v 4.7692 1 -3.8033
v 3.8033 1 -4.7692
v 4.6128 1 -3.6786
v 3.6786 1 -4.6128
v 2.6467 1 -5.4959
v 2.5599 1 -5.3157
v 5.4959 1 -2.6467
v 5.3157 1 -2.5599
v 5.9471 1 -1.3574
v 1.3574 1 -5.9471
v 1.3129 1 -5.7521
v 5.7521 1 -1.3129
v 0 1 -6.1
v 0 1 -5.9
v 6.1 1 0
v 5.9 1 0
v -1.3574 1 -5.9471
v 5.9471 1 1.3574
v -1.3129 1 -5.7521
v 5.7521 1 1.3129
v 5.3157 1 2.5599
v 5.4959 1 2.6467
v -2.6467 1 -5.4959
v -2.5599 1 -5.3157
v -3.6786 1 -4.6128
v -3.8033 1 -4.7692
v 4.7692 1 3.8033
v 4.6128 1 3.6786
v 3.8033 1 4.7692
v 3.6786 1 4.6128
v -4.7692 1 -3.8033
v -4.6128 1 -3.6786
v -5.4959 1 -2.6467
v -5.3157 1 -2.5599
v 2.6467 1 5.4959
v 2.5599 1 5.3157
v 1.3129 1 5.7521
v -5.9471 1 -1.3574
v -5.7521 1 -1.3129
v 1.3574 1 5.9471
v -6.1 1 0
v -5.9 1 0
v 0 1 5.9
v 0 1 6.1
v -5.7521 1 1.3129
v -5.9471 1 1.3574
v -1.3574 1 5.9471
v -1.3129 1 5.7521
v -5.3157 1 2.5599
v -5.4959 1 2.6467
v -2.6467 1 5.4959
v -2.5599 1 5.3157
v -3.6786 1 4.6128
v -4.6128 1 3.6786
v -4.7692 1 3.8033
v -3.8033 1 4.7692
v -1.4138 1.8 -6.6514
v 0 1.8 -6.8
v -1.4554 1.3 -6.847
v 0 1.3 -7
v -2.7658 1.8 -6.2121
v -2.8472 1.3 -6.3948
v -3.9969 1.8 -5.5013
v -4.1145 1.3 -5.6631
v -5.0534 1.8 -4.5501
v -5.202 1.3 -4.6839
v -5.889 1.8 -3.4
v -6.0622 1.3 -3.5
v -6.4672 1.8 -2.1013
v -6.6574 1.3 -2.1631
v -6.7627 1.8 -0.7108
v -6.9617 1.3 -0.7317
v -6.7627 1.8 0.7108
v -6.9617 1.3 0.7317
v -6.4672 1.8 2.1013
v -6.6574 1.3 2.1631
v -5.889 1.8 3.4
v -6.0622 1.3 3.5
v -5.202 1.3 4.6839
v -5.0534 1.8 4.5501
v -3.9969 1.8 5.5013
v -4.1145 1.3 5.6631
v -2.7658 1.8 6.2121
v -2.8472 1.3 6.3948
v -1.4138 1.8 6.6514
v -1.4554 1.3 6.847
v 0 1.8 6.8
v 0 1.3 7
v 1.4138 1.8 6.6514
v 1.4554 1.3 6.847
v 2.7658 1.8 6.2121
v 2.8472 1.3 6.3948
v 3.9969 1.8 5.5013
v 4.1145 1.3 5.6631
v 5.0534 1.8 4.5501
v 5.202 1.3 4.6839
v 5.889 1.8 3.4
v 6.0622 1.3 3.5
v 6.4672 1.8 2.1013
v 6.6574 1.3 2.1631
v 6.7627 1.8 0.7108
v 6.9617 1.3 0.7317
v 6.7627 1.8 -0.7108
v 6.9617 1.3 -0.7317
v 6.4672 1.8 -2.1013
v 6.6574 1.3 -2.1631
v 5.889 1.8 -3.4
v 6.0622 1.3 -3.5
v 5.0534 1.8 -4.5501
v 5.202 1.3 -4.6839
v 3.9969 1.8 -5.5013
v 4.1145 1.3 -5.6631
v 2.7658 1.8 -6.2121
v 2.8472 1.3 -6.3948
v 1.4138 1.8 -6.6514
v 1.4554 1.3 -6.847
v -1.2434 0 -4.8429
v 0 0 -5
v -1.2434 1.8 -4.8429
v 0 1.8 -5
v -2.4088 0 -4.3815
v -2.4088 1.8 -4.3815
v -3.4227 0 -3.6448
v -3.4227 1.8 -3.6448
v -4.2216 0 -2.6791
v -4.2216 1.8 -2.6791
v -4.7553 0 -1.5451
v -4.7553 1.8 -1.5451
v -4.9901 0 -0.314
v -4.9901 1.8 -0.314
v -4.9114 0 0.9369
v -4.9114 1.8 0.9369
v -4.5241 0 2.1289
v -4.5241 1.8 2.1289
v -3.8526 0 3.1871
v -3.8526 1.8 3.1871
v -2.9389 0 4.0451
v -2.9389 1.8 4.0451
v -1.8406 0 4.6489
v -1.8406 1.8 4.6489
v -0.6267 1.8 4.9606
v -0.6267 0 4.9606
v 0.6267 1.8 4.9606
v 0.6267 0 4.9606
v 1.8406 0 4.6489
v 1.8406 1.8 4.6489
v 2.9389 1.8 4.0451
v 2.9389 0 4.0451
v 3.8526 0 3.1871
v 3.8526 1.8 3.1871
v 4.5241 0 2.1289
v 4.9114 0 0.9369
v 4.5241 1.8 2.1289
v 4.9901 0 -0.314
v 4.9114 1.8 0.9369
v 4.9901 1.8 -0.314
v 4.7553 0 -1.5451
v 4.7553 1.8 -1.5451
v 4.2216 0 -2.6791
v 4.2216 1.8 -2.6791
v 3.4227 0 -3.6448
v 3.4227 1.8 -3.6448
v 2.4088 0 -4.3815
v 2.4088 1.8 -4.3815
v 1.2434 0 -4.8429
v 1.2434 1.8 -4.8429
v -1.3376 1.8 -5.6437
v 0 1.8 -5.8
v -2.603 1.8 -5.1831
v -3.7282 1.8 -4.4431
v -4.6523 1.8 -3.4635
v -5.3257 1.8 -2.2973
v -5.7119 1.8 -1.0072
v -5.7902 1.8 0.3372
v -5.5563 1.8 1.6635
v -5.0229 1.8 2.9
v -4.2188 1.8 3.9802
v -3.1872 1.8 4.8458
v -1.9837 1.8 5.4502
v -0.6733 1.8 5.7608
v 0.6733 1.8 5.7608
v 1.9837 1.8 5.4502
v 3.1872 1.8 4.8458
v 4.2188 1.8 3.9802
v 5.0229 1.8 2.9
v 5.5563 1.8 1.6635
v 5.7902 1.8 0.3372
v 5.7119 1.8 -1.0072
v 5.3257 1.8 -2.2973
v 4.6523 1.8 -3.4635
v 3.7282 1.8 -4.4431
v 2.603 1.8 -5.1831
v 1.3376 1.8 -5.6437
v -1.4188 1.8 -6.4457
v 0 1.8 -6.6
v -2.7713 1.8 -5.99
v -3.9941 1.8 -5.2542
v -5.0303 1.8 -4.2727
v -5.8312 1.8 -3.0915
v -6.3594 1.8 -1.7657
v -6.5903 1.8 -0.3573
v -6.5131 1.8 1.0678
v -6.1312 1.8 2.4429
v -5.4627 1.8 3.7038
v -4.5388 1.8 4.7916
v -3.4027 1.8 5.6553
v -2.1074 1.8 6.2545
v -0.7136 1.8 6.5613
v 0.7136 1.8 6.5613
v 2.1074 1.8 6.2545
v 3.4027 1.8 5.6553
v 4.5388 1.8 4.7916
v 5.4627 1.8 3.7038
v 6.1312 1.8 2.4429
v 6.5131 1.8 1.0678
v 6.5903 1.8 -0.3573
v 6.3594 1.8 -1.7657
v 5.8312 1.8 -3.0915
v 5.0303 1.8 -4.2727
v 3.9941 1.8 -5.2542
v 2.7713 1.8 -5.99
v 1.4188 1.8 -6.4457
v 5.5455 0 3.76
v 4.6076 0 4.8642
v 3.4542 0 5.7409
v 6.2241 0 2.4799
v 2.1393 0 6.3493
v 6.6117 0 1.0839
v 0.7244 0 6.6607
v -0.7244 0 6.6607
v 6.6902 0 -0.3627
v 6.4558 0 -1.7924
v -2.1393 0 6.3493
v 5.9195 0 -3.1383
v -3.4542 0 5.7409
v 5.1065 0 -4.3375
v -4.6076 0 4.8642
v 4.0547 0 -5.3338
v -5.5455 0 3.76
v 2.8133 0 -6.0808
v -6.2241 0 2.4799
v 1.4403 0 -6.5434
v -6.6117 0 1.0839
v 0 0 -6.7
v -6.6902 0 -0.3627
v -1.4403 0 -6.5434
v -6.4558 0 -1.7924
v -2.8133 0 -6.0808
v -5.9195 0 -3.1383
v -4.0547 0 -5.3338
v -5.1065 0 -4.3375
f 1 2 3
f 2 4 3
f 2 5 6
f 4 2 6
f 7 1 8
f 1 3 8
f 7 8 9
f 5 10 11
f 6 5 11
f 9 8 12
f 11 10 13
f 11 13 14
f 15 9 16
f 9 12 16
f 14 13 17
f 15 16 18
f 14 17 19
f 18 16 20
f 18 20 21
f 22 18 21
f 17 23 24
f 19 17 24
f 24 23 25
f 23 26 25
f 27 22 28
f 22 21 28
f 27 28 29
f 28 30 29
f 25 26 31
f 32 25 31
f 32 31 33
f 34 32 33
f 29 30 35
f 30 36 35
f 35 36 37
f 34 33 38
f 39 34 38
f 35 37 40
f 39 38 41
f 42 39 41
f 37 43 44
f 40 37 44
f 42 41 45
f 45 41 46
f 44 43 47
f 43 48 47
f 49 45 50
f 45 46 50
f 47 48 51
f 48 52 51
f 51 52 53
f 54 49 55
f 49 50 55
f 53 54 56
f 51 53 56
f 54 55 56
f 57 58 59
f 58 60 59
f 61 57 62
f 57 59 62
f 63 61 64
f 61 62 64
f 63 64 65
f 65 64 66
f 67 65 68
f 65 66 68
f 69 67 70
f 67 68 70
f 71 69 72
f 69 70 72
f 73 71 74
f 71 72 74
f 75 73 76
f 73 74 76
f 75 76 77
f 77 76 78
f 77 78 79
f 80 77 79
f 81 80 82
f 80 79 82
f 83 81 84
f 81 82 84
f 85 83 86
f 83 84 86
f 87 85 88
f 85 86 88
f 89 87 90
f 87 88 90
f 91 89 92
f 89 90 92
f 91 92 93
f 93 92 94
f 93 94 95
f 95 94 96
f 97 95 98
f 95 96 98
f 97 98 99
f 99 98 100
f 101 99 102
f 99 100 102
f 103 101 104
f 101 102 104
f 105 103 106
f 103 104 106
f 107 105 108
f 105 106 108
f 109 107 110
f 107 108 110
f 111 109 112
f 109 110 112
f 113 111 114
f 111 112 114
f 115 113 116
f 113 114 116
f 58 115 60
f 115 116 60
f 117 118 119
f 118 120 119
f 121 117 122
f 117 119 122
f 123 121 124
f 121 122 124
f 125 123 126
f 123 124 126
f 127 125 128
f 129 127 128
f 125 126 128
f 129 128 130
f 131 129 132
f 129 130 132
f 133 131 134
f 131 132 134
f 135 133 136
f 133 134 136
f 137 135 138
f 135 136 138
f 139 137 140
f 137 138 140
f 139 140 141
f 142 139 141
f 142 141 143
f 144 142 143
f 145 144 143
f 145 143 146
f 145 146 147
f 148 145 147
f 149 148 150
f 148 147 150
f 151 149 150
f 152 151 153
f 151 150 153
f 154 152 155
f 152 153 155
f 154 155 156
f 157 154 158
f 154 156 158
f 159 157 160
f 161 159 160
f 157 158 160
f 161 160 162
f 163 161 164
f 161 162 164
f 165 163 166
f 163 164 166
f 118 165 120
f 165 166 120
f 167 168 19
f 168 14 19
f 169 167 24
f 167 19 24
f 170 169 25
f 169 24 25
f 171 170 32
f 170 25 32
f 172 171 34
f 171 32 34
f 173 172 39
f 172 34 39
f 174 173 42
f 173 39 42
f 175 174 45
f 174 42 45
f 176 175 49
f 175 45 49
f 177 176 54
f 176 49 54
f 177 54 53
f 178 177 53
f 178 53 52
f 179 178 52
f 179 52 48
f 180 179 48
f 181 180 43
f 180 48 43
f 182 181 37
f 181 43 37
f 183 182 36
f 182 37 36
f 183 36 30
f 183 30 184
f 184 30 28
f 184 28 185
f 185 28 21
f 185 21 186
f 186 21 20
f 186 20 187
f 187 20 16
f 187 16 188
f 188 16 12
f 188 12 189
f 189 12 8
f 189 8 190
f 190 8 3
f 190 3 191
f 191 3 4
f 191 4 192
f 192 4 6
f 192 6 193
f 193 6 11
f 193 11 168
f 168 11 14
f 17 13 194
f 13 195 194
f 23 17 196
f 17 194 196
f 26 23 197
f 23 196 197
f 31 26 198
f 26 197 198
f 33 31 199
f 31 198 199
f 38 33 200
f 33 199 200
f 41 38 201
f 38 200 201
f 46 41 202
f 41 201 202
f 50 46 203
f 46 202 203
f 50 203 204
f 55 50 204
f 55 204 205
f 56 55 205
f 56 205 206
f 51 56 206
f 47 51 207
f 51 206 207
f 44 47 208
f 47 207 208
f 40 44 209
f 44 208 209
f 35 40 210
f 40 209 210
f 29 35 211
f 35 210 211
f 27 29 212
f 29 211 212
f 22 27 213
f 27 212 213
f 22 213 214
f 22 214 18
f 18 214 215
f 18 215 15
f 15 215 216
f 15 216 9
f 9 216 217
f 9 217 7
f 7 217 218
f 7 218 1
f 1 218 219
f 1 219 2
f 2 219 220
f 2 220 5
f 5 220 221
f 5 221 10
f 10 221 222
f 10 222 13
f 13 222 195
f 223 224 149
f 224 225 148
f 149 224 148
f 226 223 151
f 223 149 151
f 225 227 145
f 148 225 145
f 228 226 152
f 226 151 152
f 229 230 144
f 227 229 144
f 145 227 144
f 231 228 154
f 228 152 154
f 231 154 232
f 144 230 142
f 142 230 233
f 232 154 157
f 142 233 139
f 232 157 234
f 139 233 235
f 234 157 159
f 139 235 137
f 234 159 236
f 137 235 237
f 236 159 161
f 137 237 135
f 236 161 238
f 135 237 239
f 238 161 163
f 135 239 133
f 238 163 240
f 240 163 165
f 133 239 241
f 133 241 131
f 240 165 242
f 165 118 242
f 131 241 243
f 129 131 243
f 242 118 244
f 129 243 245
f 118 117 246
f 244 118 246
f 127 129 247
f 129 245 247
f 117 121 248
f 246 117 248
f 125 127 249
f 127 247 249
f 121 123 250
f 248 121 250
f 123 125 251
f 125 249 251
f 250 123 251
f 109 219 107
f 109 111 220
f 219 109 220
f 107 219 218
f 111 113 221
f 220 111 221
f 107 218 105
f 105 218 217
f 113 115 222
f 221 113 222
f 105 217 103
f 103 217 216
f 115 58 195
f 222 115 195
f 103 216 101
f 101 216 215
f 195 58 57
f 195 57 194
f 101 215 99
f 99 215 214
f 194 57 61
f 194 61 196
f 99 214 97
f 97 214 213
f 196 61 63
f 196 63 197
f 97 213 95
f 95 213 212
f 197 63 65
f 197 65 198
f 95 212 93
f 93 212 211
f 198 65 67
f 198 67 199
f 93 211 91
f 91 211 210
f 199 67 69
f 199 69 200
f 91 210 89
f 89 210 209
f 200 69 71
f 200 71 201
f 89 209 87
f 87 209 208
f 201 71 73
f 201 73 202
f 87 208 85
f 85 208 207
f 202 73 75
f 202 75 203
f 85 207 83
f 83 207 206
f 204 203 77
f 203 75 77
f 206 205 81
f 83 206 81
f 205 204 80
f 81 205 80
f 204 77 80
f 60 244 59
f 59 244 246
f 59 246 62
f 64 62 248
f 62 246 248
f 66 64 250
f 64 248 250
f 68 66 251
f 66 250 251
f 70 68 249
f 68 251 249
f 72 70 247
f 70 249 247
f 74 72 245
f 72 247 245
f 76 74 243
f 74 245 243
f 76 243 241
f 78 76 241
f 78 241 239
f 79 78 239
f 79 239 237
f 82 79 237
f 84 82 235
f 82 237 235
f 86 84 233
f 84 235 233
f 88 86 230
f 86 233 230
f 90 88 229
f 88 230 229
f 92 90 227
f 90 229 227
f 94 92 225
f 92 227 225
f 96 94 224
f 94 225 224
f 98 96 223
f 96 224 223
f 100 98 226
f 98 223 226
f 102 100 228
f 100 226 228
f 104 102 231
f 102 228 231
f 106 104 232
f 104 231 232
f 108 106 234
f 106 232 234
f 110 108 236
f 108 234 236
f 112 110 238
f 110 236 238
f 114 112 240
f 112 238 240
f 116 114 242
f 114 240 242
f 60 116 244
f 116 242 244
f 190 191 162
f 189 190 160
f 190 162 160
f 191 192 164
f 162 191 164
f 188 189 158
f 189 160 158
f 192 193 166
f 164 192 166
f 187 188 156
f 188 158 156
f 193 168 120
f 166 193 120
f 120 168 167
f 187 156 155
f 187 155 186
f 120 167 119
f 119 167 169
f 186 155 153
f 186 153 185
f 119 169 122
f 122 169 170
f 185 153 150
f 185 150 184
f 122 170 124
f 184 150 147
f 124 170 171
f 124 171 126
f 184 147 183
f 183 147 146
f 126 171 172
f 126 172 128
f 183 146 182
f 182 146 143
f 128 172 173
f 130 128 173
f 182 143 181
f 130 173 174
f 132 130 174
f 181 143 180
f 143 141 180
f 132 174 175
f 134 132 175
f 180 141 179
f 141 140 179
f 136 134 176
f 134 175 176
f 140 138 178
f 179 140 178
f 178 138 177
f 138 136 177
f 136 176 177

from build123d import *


with BuildPart() as part:
    # SealProfileS → SealProfile (revolve)
    with BuildSketch(Plane.XY, mode=Mode.PRIVATE) as sealprofile_sk:
        Polygon((5, 0), (5, 1.8), (5.8, 1.8), (5.9, 1), (6.1, 1), (6.6, 1.8), (6.8, 1.8), (7, 1.3), (6.7, 0), align=None)
    revolve(sealprofile_sk.sketch.rotate(Axis((0, 0, 0), (0, 1, 0)), 90), axis=Axis((0, 0, 0), (0, 1, 0)))


solid = part.part
